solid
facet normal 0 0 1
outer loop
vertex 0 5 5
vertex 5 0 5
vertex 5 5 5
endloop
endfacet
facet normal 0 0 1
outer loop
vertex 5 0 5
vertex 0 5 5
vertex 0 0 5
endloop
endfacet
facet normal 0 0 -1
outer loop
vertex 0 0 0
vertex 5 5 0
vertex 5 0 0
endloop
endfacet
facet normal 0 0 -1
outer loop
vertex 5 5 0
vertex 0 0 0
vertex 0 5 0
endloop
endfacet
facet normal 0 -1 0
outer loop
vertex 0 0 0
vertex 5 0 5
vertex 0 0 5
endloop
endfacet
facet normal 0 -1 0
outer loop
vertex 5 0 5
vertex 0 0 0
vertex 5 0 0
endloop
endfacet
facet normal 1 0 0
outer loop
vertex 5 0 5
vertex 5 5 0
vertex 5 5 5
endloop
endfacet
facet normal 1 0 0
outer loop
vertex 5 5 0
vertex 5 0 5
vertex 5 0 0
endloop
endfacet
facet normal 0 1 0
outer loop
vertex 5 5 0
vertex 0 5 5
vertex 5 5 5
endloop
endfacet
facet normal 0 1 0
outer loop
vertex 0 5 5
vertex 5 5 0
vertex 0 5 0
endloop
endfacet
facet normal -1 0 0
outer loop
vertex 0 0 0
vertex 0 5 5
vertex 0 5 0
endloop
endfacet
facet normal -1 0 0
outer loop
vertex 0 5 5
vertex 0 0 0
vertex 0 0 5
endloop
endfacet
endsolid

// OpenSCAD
/*
 * OpenSCAD Workshop Examples
 * Copyright (c) 2013 Anar Software LLC. < http://anars.com >
 *
 * This program is free software: you can redistribute it and/or modify it under
 * the terms of the GNU General Public License as published by the Free Software
 * Foundation, either version 3 of the License, or (at your option) any later
 * version.
 *
 * This program is distributed in the hope that it will be useful, but WITHOUT
 * ANY WARRANTY; without even the implied warranty of MERCHANTABILITY or FITNESS
 * FOR A PARTICULAR PURPOSE. See the GNU General Public License for more details.
 *
 * You should have received a copy of the GNU General Public License along with
 * this program. If not, see < http://www.gnu.org/licenses/ >
 *
 */
/*

Creates a cube with sides of that 1 unit length in the first octant. The argument names are optional if the arguments are given in the same order as specified in the parameters.

Parameters :

	cube(x);

*/

cube(5);
